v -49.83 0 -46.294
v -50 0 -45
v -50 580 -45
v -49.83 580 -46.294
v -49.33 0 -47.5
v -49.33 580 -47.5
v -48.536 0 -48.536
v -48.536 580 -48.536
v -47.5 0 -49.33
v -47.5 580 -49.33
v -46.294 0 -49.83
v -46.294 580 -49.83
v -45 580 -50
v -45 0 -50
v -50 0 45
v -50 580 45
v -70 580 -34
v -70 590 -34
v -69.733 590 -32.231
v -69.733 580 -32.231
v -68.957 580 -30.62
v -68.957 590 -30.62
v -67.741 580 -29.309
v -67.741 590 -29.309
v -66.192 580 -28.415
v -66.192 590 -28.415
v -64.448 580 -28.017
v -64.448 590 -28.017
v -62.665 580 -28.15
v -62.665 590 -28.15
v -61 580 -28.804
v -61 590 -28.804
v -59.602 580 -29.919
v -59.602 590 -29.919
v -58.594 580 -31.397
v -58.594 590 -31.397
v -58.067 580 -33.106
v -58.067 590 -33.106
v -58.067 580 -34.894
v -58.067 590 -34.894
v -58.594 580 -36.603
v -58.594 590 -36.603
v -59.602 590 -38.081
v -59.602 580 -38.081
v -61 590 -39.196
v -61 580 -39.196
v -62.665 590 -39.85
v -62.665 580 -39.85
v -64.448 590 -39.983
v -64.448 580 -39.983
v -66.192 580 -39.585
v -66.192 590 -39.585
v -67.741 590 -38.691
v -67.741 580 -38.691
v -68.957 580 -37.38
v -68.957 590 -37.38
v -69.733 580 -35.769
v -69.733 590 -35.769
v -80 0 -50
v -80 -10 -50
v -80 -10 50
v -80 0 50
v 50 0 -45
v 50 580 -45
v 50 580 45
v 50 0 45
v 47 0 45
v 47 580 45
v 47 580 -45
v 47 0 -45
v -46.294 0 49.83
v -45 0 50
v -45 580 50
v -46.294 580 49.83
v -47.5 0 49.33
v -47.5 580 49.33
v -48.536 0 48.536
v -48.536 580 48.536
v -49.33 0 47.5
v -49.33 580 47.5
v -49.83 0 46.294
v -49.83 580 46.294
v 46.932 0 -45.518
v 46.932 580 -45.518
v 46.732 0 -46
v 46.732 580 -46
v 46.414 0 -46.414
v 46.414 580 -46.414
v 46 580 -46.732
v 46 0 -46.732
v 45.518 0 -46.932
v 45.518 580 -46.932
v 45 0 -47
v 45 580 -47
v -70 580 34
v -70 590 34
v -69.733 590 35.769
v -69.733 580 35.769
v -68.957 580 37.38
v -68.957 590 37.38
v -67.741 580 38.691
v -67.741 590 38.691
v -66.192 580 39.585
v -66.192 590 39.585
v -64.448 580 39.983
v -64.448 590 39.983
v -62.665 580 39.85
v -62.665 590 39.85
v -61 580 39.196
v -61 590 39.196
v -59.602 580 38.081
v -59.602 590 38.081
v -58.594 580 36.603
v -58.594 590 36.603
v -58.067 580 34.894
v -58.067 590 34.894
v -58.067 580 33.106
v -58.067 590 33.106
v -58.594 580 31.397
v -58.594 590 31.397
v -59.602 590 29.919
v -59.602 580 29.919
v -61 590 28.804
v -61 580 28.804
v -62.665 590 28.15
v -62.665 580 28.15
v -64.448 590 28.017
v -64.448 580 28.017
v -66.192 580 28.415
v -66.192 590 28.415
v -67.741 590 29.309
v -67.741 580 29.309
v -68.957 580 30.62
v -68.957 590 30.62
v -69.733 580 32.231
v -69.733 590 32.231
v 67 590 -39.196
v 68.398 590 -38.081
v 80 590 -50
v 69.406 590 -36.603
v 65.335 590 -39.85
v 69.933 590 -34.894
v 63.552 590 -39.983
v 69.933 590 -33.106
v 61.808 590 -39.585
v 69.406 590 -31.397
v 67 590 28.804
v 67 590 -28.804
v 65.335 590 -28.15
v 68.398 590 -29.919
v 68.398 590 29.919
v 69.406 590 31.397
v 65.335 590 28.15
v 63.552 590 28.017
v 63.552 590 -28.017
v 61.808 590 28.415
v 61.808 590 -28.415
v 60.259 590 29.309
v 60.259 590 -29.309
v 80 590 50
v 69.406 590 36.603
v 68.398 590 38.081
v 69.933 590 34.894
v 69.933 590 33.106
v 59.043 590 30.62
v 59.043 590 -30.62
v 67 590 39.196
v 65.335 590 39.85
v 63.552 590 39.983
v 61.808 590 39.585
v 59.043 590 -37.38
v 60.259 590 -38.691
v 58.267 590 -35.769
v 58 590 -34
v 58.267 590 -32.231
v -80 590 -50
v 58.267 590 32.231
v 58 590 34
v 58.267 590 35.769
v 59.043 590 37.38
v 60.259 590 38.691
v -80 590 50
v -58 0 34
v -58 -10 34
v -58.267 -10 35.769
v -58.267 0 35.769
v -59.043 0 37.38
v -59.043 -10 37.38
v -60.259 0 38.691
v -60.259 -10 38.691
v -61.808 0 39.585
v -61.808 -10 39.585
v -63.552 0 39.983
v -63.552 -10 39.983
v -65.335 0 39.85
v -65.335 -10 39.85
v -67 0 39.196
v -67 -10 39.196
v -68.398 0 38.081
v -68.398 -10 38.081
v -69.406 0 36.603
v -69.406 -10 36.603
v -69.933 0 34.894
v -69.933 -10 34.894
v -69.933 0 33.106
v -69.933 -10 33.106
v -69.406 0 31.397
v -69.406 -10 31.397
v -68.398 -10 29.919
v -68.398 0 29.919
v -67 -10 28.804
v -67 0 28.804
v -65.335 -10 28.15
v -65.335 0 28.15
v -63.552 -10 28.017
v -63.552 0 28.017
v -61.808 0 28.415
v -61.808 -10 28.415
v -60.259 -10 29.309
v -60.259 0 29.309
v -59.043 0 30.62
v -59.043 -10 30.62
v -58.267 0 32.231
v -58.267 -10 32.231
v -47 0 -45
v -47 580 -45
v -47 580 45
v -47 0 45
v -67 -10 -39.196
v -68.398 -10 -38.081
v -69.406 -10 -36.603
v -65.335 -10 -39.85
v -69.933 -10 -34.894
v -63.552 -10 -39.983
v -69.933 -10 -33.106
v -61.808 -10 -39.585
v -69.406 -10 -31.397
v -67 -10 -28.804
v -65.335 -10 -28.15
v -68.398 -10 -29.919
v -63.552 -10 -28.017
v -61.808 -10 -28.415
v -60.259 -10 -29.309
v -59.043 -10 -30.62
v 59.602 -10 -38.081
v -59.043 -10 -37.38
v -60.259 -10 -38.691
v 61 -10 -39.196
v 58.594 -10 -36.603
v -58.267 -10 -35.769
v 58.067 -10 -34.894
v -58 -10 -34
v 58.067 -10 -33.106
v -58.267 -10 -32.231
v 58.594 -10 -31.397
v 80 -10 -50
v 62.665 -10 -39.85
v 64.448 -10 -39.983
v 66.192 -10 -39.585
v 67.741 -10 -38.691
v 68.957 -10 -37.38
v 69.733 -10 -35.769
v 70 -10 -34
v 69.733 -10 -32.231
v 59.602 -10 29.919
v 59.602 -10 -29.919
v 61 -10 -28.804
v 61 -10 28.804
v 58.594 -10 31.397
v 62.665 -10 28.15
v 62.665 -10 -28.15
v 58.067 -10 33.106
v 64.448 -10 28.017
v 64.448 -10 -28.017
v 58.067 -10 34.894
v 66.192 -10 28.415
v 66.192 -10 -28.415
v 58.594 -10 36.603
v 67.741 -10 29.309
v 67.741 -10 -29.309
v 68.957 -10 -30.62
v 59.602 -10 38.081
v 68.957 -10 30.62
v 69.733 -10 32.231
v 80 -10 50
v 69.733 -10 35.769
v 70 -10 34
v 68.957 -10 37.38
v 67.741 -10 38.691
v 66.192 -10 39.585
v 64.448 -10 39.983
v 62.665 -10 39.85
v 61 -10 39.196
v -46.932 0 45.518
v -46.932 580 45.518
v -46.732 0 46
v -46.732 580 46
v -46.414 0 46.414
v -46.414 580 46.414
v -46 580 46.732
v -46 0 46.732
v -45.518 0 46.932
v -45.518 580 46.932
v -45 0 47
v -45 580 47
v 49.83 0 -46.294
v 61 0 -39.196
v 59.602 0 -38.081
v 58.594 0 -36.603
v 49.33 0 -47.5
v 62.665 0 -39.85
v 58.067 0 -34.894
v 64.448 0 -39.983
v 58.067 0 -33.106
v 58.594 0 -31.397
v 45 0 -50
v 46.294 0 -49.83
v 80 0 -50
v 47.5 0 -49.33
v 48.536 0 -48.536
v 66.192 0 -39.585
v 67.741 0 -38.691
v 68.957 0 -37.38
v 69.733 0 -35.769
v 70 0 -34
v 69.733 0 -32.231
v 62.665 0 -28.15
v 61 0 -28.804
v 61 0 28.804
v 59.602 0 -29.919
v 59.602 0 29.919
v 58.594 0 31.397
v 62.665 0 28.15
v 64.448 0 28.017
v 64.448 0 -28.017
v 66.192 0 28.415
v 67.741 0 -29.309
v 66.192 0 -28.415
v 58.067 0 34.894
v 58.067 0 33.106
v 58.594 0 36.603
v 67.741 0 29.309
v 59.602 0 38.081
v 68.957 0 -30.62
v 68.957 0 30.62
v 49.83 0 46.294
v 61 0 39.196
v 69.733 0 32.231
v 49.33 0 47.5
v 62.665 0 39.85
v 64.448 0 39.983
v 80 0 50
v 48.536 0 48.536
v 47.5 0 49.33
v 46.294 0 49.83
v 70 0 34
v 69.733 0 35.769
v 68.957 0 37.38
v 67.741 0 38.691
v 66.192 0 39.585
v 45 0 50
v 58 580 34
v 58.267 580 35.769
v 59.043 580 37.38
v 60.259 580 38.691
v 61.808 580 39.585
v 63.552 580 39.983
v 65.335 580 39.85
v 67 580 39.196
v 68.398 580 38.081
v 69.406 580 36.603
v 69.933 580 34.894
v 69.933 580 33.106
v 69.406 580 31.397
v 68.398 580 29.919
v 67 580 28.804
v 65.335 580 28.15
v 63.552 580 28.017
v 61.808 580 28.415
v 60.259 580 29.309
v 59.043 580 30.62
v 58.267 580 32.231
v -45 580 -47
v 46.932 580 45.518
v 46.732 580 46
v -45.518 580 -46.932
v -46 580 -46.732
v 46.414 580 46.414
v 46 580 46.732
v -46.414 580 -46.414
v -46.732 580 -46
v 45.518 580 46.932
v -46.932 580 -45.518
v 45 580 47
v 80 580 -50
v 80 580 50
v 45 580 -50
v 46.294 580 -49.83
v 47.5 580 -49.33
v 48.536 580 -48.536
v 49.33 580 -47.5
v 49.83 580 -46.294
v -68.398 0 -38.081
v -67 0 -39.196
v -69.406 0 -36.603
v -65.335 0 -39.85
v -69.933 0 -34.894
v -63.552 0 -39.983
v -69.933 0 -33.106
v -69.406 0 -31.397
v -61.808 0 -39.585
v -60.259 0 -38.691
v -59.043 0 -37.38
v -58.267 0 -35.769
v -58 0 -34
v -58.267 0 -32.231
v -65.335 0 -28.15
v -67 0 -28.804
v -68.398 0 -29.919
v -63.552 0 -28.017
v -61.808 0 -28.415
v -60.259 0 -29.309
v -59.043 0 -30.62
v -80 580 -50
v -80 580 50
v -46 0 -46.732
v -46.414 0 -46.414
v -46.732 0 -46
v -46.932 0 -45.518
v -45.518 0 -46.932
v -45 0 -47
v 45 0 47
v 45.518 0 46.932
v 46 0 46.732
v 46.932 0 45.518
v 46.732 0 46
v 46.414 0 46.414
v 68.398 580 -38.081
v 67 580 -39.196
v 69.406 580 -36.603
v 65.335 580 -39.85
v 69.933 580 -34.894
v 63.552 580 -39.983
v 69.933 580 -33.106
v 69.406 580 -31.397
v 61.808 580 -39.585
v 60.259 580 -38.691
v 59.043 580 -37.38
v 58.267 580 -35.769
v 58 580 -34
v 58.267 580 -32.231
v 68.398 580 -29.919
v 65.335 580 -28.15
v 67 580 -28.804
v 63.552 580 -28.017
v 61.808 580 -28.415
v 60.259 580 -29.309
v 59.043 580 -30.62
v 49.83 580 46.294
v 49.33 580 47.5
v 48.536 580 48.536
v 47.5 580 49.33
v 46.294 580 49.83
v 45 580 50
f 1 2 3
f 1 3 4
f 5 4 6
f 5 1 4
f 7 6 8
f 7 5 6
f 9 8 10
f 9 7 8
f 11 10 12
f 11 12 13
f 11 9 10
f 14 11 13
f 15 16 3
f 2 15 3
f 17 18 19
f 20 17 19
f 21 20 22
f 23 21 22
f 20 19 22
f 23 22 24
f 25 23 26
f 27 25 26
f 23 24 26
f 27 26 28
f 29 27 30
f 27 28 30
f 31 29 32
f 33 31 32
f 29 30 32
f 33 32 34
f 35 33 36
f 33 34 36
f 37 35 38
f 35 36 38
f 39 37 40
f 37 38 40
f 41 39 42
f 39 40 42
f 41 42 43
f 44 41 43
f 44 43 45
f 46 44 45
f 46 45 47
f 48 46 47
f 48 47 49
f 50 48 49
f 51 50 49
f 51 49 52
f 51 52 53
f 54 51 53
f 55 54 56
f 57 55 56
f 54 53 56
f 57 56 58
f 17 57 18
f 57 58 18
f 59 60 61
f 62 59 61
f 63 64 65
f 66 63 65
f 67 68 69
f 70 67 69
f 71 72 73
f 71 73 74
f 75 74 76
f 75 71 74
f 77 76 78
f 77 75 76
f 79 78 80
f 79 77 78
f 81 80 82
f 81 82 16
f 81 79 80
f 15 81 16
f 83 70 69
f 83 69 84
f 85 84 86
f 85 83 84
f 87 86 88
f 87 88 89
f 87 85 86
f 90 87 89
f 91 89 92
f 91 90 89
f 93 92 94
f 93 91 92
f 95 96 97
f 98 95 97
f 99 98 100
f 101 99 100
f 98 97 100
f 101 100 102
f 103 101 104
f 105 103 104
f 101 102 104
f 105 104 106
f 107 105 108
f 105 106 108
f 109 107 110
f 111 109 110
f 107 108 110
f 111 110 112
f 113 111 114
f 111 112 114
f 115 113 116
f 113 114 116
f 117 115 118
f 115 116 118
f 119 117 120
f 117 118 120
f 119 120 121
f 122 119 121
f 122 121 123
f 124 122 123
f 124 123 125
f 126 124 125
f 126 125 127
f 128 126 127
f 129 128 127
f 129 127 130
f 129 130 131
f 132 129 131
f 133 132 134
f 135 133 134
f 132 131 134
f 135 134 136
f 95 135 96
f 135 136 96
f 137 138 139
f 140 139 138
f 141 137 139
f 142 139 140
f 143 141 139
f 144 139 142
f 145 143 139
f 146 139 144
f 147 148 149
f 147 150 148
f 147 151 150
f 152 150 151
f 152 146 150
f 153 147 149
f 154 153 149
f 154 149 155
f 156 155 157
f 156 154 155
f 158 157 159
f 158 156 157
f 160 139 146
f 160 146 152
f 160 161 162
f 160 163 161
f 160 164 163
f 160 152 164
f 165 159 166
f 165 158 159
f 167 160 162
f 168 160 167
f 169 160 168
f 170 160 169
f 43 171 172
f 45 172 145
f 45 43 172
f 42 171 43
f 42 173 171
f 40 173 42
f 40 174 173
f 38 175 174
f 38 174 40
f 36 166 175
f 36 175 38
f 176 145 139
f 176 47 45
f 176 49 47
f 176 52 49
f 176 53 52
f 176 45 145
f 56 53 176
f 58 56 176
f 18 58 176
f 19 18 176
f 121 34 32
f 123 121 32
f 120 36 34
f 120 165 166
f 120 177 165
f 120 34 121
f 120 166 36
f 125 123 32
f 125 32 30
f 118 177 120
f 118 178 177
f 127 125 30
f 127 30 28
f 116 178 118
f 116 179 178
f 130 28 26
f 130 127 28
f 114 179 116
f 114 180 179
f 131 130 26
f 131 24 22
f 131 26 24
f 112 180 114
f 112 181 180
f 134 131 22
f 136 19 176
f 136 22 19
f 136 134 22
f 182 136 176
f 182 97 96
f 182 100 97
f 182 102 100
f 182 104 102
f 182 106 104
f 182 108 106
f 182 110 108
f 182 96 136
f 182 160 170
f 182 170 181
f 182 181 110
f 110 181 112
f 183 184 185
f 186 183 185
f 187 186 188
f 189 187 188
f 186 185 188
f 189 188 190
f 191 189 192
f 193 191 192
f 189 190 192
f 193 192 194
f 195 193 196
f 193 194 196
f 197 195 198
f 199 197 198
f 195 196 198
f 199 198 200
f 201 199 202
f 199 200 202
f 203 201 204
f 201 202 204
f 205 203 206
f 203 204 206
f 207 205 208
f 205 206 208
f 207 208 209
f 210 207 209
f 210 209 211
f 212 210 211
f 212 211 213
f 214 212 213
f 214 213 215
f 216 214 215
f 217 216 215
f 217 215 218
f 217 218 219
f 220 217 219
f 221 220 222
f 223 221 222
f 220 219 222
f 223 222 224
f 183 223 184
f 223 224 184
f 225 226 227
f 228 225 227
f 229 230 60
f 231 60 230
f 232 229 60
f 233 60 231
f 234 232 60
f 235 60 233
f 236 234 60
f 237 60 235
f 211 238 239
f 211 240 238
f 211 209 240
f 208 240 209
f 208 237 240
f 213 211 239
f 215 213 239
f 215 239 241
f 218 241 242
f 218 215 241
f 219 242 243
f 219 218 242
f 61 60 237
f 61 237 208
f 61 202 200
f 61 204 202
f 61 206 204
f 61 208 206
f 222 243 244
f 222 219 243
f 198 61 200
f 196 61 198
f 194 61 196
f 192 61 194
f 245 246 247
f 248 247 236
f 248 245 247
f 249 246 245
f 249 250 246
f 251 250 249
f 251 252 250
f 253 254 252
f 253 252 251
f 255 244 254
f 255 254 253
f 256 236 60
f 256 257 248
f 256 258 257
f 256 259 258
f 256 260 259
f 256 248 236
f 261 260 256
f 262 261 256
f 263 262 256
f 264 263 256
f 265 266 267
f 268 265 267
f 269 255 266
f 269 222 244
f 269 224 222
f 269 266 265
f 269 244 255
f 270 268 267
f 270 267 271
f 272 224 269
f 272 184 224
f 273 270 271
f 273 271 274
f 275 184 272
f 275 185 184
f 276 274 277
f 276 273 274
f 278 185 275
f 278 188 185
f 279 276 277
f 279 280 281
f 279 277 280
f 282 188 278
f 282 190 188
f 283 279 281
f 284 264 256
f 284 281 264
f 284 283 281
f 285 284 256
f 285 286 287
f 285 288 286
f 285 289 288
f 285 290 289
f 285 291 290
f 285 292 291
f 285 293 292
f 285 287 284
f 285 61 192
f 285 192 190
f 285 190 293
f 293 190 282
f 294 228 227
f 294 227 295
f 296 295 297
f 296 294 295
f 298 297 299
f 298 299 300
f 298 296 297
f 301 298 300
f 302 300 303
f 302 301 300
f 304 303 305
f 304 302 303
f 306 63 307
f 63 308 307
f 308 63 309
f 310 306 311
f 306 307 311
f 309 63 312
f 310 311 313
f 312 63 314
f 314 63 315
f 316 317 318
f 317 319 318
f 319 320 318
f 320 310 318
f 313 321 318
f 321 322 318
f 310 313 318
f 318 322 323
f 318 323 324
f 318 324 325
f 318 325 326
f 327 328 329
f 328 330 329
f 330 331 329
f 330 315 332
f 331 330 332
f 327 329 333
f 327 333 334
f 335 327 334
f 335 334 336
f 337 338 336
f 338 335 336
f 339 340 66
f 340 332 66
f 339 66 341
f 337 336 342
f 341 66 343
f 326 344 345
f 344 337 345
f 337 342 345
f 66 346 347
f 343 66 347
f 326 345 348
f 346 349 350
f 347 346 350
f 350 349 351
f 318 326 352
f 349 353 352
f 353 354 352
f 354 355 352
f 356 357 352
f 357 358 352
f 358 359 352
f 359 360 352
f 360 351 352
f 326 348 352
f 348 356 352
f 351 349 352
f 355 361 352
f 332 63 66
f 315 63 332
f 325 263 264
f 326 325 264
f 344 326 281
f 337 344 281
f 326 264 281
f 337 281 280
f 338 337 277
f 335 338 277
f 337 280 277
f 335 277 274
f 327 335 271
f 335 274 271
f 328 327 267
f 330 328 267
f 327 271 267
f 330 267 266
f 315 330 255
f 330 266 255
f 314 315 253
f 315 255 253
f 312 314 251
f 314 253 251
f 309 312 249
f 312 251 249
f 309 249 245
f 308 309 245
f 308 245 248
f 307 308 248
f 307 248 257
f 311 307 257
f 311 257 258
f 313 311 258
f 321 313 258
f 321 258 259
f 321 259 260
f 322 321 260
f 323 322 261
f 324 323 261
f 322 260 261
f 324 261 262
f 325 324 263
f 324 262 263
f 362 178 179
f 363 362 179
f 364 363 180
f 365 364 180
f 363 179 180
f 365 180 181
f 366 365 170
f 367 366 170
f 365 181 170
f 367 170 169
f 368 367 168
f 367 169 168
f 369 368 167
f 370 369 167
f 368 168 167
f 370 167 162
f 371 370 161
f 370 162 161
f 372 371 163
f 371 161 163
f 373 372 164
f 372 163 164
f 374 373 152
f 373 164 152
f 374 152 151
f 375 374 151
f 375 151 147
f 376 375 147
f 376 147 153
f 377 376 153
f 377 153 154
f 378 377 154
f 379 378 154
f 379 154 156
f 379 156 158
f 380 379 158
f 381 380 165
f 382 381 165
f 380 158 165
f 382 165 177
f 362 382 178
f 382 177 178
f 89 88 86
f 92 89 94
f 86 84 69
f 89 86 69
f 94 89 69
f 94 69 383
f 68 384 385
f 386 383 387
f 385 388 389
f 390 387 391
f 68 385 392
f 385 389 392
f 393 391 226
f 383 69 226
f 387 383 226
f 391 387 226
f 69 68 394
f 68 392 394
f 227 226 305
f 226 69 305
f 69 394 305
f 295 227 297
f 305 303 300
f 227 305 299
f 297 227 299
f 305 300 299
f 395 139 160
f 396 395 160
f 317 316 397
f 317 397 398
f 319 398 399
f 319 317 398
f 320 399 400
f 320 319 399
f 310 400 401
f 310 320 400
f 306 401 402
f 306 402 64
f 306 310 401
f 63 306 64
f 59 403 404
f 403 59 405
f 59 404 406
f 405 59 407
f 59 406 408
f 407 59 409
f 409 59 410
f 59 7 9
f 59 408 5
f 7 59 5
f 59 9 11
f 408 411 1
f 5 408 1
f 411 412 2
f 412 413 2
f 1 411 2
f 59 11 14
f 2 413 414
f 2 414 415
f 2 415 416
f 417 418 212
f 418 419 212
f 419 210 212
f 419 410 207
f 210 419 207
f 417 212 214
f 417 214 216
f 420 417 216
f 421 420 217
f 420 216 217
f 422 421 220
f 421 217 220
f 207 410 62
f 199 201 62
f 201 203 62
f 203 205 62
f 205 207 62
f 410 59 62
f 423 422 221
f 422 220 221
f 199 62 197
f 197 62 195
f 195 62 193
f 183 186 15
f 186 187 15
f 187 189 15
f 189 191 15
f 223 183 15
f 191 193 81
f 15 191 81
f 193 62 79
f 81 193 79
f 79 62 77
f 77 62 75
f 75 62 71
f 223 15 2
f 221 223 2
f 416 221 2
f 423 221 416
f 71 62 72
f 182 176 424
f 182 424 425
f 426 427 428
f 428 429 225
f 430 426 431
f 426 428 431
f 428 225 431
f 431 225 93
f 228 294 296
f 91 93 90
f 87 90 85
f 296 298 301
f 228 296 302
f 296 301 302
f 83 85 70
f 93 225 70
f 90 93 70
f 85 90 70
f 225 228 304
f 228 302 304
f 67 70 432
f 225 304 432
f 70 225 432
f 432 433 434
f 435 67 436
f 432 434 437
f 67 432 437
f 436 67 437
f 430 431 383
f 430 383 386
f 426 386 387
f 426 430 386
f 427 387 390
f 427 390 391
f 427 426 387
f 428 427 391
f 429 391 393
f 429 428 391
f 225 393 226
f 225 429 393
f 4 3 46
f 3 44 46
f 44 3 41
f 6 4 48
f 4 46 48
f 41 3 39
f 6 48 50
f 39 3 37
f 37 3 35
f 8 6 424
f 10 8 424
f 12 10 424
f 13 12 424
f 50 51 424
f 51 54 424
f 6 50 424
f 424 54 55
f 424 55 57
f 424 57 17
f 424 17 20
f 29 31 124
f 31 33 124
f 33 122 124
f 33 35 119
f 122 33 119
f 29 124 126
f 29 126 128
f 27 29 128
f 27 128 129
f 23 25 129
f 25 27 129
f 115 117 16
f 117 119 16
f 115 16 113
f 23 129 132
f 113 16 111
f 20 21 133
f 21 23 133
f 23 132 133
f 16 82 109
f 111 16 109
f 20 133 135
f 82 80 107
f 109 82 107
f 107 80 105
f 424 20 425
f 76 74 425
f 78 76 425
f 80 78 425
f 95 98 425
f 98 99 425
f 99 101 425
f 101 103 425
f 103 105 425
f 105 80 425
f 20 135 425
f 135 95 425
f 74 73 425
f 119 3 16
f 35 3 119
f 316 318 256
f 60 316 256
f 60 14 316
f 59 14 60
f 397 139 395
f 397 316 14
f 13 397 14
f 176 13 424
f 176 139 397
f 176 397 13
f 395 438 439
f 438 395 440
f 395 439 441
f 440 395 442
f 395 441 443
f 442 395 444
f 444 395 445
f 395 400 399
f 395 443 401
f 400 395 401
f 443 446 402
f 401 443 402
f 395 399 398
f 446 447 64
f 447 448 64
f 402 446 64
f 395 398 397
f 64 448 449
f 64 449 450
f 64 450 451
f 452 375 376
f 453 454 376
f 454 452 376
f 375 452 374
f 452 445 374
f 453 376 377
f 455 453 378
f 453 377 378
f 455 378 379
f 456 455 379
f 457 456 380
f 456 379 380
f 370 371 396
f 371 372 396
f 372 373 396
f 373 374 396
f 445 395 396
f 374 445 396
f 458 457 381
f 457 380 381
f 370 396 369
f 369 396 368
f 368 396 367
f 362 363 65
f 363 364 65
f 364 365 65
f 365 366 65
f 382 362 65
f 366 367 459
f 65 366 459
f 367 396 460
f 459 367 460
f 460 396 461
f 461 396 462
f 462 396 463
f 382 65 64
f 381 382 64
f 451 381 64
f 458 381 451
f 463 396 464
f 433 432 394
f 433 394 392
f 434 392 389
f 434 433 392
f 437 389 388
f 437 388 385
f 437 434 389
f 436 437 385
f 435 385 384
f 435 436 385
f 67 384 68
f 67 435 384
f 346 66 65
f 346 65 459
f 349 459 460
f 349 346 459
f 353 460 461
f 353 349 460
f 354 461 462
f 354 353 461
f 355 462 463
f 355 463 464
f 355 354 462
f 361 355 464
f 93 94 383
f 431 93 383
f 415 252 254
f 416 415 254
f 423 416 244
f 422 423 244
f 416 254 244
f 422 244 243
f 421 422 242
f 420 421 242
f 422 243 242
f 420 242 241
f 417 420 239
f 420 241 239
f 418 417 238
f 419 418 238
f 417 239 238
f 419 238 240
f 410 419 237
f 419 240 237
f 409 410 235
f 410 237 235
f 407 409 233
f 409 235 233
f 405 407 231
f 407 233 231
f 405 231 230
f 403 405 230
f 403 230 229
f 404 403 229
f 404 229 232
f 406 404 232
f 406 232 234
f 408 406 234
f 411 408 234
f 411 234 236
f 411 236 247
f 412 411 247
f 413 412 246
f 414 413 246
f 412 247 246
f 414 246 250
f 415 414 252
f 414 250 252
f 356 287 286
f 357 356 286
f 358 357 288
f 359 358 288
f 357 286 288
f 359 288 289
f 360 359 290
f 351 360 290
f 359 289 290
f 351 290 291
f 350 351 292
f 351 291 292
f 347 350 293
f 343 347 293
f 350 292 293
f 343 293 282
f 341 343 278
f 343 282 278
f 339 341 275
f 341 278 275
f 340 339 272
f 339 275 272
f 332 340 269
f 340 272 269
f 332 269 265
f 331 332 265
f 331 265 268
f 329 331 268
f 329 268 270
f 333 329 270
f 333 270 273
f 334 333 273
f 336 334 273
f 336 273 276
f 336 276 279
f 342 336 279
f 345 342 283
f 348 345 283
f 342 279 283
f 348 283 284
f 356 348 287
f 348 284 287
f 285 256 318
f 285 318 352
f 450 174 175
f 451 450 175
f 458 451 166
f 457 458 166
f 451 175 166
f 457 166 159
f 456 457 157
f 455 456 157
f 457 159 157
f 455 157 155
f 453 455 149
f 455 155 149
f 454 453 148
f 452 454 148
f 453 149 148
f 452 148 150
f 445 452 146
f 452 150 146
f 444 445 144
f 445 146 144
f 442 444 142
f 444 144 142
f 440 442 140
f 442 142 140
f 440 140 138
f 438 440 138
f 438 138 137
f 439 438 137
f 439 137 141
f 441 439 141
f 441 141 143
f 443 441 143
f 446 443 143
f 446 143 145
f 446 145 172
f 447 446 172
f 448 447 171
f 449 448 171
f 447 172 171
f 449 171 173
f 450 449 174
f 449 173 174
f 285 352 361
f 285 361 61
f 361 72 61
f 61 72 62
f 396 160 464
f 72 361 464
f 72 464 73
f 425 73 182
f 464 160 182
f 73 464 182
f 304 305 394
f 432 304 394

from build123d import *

# Parameters (mm, degrees)
F1_DEPTH = 580
F3_W     = 160
F3_H     = 100
F3_R     = 6
F4_DEPTH = 10
F6_W     = 160
F6_H     = 100
F6_R     = 6
F7_DEPTH = 10


with BuildPart() as f1:
    # F0 (on Front) → F1 (new body)
    with BuildSketch(Plane.XZ):
        with BuildLine():
            ThreePointArc((50, 45), (48.5355339059, 48.5355339059), (45, 50))
            Line((45, 50), (-45, 50))
            ThreePointArc((-45, 50), (-48.5355339059, 48.5355339059), (-50, 45))
            Line((-50, 45), (-50, -45))
            ThreePointArc((-50, -45), (-48.5355339059, -48.5355339059), (-45, -50))
            Line((-45, -50), (45, -50))
            ThreePointArc((45, -50), (48.5355339059, -48.5355339059), (50, -45))
            Line((50, -45), (50, 45))
        make_face()
        with BuildLine():
            ThreePointArc((-47, 45), (-46.4142135624, 46.4142135624), (-45, 47))
            Line((-45, 47), (45, 47))
            ThreePointArc((45, 47), (46.4142135624, 46.4142135624), (47, 45))
            Line((47, 45), (47, -45))
            ThreePointArc((47, -45), (46.4142135624, -46.4142135624), (45, -47))
            Line((45, -47), (-45, -47))
            ThreePointArc((-45, -47), (-46.4142135624, -46.4142135624), (-47, -45))
            Line((-47, -45), (-47, 45))
        make_face(mode=Mode.SUBTRACT)
    extrude(amount=-F1_DEPTH)

    # F3 (on offset) → F4 (join)
    with BuildSketch(Plane.XZ.offset(10)):
        Rectangle(F3_W, F3_H)
        with Locations((-64, -34)):
            Circle(F3_R, mode=Mode.SUBTRACT)
        with Locations((64, -34)):
            Circle(F3_R, mode=Mode.SUBTRACT)
        with Locations((-64, 34)):
            Circle(F3_R, mode=Mode.SUBTRACT)
        with Locations((64, 34)):
            Circle(F3_R, mode=Mode.SUBTRACT)
    extrude(amount=-F4_DEPTH)

    # F6 (on offset) → F7 (join)
    with BuildSketch(Plane(origin=(0, 590, 0), x_dir=(-1, 0, 0), z_dir=(0, 1, 0))):
        Rectangle(F6_W, F6_H)
        with Locations((-64, -34)):
            Circle(F6_R, mode=Mode.SUBTRACT)
        with Locations((64, -34)):
            Circle(F6_R, mode=Mode.SUBTRACT)
        with Locations((-64, 34)):
            Circle(F6_R, mode=Mode.SUBTRACT)
        with Locations((64, 34)):
            Circle(F6_R, mode=Mode.SUBTRACT)
    extrude(amount=-F7_DEPTH)


solid = f1.part
